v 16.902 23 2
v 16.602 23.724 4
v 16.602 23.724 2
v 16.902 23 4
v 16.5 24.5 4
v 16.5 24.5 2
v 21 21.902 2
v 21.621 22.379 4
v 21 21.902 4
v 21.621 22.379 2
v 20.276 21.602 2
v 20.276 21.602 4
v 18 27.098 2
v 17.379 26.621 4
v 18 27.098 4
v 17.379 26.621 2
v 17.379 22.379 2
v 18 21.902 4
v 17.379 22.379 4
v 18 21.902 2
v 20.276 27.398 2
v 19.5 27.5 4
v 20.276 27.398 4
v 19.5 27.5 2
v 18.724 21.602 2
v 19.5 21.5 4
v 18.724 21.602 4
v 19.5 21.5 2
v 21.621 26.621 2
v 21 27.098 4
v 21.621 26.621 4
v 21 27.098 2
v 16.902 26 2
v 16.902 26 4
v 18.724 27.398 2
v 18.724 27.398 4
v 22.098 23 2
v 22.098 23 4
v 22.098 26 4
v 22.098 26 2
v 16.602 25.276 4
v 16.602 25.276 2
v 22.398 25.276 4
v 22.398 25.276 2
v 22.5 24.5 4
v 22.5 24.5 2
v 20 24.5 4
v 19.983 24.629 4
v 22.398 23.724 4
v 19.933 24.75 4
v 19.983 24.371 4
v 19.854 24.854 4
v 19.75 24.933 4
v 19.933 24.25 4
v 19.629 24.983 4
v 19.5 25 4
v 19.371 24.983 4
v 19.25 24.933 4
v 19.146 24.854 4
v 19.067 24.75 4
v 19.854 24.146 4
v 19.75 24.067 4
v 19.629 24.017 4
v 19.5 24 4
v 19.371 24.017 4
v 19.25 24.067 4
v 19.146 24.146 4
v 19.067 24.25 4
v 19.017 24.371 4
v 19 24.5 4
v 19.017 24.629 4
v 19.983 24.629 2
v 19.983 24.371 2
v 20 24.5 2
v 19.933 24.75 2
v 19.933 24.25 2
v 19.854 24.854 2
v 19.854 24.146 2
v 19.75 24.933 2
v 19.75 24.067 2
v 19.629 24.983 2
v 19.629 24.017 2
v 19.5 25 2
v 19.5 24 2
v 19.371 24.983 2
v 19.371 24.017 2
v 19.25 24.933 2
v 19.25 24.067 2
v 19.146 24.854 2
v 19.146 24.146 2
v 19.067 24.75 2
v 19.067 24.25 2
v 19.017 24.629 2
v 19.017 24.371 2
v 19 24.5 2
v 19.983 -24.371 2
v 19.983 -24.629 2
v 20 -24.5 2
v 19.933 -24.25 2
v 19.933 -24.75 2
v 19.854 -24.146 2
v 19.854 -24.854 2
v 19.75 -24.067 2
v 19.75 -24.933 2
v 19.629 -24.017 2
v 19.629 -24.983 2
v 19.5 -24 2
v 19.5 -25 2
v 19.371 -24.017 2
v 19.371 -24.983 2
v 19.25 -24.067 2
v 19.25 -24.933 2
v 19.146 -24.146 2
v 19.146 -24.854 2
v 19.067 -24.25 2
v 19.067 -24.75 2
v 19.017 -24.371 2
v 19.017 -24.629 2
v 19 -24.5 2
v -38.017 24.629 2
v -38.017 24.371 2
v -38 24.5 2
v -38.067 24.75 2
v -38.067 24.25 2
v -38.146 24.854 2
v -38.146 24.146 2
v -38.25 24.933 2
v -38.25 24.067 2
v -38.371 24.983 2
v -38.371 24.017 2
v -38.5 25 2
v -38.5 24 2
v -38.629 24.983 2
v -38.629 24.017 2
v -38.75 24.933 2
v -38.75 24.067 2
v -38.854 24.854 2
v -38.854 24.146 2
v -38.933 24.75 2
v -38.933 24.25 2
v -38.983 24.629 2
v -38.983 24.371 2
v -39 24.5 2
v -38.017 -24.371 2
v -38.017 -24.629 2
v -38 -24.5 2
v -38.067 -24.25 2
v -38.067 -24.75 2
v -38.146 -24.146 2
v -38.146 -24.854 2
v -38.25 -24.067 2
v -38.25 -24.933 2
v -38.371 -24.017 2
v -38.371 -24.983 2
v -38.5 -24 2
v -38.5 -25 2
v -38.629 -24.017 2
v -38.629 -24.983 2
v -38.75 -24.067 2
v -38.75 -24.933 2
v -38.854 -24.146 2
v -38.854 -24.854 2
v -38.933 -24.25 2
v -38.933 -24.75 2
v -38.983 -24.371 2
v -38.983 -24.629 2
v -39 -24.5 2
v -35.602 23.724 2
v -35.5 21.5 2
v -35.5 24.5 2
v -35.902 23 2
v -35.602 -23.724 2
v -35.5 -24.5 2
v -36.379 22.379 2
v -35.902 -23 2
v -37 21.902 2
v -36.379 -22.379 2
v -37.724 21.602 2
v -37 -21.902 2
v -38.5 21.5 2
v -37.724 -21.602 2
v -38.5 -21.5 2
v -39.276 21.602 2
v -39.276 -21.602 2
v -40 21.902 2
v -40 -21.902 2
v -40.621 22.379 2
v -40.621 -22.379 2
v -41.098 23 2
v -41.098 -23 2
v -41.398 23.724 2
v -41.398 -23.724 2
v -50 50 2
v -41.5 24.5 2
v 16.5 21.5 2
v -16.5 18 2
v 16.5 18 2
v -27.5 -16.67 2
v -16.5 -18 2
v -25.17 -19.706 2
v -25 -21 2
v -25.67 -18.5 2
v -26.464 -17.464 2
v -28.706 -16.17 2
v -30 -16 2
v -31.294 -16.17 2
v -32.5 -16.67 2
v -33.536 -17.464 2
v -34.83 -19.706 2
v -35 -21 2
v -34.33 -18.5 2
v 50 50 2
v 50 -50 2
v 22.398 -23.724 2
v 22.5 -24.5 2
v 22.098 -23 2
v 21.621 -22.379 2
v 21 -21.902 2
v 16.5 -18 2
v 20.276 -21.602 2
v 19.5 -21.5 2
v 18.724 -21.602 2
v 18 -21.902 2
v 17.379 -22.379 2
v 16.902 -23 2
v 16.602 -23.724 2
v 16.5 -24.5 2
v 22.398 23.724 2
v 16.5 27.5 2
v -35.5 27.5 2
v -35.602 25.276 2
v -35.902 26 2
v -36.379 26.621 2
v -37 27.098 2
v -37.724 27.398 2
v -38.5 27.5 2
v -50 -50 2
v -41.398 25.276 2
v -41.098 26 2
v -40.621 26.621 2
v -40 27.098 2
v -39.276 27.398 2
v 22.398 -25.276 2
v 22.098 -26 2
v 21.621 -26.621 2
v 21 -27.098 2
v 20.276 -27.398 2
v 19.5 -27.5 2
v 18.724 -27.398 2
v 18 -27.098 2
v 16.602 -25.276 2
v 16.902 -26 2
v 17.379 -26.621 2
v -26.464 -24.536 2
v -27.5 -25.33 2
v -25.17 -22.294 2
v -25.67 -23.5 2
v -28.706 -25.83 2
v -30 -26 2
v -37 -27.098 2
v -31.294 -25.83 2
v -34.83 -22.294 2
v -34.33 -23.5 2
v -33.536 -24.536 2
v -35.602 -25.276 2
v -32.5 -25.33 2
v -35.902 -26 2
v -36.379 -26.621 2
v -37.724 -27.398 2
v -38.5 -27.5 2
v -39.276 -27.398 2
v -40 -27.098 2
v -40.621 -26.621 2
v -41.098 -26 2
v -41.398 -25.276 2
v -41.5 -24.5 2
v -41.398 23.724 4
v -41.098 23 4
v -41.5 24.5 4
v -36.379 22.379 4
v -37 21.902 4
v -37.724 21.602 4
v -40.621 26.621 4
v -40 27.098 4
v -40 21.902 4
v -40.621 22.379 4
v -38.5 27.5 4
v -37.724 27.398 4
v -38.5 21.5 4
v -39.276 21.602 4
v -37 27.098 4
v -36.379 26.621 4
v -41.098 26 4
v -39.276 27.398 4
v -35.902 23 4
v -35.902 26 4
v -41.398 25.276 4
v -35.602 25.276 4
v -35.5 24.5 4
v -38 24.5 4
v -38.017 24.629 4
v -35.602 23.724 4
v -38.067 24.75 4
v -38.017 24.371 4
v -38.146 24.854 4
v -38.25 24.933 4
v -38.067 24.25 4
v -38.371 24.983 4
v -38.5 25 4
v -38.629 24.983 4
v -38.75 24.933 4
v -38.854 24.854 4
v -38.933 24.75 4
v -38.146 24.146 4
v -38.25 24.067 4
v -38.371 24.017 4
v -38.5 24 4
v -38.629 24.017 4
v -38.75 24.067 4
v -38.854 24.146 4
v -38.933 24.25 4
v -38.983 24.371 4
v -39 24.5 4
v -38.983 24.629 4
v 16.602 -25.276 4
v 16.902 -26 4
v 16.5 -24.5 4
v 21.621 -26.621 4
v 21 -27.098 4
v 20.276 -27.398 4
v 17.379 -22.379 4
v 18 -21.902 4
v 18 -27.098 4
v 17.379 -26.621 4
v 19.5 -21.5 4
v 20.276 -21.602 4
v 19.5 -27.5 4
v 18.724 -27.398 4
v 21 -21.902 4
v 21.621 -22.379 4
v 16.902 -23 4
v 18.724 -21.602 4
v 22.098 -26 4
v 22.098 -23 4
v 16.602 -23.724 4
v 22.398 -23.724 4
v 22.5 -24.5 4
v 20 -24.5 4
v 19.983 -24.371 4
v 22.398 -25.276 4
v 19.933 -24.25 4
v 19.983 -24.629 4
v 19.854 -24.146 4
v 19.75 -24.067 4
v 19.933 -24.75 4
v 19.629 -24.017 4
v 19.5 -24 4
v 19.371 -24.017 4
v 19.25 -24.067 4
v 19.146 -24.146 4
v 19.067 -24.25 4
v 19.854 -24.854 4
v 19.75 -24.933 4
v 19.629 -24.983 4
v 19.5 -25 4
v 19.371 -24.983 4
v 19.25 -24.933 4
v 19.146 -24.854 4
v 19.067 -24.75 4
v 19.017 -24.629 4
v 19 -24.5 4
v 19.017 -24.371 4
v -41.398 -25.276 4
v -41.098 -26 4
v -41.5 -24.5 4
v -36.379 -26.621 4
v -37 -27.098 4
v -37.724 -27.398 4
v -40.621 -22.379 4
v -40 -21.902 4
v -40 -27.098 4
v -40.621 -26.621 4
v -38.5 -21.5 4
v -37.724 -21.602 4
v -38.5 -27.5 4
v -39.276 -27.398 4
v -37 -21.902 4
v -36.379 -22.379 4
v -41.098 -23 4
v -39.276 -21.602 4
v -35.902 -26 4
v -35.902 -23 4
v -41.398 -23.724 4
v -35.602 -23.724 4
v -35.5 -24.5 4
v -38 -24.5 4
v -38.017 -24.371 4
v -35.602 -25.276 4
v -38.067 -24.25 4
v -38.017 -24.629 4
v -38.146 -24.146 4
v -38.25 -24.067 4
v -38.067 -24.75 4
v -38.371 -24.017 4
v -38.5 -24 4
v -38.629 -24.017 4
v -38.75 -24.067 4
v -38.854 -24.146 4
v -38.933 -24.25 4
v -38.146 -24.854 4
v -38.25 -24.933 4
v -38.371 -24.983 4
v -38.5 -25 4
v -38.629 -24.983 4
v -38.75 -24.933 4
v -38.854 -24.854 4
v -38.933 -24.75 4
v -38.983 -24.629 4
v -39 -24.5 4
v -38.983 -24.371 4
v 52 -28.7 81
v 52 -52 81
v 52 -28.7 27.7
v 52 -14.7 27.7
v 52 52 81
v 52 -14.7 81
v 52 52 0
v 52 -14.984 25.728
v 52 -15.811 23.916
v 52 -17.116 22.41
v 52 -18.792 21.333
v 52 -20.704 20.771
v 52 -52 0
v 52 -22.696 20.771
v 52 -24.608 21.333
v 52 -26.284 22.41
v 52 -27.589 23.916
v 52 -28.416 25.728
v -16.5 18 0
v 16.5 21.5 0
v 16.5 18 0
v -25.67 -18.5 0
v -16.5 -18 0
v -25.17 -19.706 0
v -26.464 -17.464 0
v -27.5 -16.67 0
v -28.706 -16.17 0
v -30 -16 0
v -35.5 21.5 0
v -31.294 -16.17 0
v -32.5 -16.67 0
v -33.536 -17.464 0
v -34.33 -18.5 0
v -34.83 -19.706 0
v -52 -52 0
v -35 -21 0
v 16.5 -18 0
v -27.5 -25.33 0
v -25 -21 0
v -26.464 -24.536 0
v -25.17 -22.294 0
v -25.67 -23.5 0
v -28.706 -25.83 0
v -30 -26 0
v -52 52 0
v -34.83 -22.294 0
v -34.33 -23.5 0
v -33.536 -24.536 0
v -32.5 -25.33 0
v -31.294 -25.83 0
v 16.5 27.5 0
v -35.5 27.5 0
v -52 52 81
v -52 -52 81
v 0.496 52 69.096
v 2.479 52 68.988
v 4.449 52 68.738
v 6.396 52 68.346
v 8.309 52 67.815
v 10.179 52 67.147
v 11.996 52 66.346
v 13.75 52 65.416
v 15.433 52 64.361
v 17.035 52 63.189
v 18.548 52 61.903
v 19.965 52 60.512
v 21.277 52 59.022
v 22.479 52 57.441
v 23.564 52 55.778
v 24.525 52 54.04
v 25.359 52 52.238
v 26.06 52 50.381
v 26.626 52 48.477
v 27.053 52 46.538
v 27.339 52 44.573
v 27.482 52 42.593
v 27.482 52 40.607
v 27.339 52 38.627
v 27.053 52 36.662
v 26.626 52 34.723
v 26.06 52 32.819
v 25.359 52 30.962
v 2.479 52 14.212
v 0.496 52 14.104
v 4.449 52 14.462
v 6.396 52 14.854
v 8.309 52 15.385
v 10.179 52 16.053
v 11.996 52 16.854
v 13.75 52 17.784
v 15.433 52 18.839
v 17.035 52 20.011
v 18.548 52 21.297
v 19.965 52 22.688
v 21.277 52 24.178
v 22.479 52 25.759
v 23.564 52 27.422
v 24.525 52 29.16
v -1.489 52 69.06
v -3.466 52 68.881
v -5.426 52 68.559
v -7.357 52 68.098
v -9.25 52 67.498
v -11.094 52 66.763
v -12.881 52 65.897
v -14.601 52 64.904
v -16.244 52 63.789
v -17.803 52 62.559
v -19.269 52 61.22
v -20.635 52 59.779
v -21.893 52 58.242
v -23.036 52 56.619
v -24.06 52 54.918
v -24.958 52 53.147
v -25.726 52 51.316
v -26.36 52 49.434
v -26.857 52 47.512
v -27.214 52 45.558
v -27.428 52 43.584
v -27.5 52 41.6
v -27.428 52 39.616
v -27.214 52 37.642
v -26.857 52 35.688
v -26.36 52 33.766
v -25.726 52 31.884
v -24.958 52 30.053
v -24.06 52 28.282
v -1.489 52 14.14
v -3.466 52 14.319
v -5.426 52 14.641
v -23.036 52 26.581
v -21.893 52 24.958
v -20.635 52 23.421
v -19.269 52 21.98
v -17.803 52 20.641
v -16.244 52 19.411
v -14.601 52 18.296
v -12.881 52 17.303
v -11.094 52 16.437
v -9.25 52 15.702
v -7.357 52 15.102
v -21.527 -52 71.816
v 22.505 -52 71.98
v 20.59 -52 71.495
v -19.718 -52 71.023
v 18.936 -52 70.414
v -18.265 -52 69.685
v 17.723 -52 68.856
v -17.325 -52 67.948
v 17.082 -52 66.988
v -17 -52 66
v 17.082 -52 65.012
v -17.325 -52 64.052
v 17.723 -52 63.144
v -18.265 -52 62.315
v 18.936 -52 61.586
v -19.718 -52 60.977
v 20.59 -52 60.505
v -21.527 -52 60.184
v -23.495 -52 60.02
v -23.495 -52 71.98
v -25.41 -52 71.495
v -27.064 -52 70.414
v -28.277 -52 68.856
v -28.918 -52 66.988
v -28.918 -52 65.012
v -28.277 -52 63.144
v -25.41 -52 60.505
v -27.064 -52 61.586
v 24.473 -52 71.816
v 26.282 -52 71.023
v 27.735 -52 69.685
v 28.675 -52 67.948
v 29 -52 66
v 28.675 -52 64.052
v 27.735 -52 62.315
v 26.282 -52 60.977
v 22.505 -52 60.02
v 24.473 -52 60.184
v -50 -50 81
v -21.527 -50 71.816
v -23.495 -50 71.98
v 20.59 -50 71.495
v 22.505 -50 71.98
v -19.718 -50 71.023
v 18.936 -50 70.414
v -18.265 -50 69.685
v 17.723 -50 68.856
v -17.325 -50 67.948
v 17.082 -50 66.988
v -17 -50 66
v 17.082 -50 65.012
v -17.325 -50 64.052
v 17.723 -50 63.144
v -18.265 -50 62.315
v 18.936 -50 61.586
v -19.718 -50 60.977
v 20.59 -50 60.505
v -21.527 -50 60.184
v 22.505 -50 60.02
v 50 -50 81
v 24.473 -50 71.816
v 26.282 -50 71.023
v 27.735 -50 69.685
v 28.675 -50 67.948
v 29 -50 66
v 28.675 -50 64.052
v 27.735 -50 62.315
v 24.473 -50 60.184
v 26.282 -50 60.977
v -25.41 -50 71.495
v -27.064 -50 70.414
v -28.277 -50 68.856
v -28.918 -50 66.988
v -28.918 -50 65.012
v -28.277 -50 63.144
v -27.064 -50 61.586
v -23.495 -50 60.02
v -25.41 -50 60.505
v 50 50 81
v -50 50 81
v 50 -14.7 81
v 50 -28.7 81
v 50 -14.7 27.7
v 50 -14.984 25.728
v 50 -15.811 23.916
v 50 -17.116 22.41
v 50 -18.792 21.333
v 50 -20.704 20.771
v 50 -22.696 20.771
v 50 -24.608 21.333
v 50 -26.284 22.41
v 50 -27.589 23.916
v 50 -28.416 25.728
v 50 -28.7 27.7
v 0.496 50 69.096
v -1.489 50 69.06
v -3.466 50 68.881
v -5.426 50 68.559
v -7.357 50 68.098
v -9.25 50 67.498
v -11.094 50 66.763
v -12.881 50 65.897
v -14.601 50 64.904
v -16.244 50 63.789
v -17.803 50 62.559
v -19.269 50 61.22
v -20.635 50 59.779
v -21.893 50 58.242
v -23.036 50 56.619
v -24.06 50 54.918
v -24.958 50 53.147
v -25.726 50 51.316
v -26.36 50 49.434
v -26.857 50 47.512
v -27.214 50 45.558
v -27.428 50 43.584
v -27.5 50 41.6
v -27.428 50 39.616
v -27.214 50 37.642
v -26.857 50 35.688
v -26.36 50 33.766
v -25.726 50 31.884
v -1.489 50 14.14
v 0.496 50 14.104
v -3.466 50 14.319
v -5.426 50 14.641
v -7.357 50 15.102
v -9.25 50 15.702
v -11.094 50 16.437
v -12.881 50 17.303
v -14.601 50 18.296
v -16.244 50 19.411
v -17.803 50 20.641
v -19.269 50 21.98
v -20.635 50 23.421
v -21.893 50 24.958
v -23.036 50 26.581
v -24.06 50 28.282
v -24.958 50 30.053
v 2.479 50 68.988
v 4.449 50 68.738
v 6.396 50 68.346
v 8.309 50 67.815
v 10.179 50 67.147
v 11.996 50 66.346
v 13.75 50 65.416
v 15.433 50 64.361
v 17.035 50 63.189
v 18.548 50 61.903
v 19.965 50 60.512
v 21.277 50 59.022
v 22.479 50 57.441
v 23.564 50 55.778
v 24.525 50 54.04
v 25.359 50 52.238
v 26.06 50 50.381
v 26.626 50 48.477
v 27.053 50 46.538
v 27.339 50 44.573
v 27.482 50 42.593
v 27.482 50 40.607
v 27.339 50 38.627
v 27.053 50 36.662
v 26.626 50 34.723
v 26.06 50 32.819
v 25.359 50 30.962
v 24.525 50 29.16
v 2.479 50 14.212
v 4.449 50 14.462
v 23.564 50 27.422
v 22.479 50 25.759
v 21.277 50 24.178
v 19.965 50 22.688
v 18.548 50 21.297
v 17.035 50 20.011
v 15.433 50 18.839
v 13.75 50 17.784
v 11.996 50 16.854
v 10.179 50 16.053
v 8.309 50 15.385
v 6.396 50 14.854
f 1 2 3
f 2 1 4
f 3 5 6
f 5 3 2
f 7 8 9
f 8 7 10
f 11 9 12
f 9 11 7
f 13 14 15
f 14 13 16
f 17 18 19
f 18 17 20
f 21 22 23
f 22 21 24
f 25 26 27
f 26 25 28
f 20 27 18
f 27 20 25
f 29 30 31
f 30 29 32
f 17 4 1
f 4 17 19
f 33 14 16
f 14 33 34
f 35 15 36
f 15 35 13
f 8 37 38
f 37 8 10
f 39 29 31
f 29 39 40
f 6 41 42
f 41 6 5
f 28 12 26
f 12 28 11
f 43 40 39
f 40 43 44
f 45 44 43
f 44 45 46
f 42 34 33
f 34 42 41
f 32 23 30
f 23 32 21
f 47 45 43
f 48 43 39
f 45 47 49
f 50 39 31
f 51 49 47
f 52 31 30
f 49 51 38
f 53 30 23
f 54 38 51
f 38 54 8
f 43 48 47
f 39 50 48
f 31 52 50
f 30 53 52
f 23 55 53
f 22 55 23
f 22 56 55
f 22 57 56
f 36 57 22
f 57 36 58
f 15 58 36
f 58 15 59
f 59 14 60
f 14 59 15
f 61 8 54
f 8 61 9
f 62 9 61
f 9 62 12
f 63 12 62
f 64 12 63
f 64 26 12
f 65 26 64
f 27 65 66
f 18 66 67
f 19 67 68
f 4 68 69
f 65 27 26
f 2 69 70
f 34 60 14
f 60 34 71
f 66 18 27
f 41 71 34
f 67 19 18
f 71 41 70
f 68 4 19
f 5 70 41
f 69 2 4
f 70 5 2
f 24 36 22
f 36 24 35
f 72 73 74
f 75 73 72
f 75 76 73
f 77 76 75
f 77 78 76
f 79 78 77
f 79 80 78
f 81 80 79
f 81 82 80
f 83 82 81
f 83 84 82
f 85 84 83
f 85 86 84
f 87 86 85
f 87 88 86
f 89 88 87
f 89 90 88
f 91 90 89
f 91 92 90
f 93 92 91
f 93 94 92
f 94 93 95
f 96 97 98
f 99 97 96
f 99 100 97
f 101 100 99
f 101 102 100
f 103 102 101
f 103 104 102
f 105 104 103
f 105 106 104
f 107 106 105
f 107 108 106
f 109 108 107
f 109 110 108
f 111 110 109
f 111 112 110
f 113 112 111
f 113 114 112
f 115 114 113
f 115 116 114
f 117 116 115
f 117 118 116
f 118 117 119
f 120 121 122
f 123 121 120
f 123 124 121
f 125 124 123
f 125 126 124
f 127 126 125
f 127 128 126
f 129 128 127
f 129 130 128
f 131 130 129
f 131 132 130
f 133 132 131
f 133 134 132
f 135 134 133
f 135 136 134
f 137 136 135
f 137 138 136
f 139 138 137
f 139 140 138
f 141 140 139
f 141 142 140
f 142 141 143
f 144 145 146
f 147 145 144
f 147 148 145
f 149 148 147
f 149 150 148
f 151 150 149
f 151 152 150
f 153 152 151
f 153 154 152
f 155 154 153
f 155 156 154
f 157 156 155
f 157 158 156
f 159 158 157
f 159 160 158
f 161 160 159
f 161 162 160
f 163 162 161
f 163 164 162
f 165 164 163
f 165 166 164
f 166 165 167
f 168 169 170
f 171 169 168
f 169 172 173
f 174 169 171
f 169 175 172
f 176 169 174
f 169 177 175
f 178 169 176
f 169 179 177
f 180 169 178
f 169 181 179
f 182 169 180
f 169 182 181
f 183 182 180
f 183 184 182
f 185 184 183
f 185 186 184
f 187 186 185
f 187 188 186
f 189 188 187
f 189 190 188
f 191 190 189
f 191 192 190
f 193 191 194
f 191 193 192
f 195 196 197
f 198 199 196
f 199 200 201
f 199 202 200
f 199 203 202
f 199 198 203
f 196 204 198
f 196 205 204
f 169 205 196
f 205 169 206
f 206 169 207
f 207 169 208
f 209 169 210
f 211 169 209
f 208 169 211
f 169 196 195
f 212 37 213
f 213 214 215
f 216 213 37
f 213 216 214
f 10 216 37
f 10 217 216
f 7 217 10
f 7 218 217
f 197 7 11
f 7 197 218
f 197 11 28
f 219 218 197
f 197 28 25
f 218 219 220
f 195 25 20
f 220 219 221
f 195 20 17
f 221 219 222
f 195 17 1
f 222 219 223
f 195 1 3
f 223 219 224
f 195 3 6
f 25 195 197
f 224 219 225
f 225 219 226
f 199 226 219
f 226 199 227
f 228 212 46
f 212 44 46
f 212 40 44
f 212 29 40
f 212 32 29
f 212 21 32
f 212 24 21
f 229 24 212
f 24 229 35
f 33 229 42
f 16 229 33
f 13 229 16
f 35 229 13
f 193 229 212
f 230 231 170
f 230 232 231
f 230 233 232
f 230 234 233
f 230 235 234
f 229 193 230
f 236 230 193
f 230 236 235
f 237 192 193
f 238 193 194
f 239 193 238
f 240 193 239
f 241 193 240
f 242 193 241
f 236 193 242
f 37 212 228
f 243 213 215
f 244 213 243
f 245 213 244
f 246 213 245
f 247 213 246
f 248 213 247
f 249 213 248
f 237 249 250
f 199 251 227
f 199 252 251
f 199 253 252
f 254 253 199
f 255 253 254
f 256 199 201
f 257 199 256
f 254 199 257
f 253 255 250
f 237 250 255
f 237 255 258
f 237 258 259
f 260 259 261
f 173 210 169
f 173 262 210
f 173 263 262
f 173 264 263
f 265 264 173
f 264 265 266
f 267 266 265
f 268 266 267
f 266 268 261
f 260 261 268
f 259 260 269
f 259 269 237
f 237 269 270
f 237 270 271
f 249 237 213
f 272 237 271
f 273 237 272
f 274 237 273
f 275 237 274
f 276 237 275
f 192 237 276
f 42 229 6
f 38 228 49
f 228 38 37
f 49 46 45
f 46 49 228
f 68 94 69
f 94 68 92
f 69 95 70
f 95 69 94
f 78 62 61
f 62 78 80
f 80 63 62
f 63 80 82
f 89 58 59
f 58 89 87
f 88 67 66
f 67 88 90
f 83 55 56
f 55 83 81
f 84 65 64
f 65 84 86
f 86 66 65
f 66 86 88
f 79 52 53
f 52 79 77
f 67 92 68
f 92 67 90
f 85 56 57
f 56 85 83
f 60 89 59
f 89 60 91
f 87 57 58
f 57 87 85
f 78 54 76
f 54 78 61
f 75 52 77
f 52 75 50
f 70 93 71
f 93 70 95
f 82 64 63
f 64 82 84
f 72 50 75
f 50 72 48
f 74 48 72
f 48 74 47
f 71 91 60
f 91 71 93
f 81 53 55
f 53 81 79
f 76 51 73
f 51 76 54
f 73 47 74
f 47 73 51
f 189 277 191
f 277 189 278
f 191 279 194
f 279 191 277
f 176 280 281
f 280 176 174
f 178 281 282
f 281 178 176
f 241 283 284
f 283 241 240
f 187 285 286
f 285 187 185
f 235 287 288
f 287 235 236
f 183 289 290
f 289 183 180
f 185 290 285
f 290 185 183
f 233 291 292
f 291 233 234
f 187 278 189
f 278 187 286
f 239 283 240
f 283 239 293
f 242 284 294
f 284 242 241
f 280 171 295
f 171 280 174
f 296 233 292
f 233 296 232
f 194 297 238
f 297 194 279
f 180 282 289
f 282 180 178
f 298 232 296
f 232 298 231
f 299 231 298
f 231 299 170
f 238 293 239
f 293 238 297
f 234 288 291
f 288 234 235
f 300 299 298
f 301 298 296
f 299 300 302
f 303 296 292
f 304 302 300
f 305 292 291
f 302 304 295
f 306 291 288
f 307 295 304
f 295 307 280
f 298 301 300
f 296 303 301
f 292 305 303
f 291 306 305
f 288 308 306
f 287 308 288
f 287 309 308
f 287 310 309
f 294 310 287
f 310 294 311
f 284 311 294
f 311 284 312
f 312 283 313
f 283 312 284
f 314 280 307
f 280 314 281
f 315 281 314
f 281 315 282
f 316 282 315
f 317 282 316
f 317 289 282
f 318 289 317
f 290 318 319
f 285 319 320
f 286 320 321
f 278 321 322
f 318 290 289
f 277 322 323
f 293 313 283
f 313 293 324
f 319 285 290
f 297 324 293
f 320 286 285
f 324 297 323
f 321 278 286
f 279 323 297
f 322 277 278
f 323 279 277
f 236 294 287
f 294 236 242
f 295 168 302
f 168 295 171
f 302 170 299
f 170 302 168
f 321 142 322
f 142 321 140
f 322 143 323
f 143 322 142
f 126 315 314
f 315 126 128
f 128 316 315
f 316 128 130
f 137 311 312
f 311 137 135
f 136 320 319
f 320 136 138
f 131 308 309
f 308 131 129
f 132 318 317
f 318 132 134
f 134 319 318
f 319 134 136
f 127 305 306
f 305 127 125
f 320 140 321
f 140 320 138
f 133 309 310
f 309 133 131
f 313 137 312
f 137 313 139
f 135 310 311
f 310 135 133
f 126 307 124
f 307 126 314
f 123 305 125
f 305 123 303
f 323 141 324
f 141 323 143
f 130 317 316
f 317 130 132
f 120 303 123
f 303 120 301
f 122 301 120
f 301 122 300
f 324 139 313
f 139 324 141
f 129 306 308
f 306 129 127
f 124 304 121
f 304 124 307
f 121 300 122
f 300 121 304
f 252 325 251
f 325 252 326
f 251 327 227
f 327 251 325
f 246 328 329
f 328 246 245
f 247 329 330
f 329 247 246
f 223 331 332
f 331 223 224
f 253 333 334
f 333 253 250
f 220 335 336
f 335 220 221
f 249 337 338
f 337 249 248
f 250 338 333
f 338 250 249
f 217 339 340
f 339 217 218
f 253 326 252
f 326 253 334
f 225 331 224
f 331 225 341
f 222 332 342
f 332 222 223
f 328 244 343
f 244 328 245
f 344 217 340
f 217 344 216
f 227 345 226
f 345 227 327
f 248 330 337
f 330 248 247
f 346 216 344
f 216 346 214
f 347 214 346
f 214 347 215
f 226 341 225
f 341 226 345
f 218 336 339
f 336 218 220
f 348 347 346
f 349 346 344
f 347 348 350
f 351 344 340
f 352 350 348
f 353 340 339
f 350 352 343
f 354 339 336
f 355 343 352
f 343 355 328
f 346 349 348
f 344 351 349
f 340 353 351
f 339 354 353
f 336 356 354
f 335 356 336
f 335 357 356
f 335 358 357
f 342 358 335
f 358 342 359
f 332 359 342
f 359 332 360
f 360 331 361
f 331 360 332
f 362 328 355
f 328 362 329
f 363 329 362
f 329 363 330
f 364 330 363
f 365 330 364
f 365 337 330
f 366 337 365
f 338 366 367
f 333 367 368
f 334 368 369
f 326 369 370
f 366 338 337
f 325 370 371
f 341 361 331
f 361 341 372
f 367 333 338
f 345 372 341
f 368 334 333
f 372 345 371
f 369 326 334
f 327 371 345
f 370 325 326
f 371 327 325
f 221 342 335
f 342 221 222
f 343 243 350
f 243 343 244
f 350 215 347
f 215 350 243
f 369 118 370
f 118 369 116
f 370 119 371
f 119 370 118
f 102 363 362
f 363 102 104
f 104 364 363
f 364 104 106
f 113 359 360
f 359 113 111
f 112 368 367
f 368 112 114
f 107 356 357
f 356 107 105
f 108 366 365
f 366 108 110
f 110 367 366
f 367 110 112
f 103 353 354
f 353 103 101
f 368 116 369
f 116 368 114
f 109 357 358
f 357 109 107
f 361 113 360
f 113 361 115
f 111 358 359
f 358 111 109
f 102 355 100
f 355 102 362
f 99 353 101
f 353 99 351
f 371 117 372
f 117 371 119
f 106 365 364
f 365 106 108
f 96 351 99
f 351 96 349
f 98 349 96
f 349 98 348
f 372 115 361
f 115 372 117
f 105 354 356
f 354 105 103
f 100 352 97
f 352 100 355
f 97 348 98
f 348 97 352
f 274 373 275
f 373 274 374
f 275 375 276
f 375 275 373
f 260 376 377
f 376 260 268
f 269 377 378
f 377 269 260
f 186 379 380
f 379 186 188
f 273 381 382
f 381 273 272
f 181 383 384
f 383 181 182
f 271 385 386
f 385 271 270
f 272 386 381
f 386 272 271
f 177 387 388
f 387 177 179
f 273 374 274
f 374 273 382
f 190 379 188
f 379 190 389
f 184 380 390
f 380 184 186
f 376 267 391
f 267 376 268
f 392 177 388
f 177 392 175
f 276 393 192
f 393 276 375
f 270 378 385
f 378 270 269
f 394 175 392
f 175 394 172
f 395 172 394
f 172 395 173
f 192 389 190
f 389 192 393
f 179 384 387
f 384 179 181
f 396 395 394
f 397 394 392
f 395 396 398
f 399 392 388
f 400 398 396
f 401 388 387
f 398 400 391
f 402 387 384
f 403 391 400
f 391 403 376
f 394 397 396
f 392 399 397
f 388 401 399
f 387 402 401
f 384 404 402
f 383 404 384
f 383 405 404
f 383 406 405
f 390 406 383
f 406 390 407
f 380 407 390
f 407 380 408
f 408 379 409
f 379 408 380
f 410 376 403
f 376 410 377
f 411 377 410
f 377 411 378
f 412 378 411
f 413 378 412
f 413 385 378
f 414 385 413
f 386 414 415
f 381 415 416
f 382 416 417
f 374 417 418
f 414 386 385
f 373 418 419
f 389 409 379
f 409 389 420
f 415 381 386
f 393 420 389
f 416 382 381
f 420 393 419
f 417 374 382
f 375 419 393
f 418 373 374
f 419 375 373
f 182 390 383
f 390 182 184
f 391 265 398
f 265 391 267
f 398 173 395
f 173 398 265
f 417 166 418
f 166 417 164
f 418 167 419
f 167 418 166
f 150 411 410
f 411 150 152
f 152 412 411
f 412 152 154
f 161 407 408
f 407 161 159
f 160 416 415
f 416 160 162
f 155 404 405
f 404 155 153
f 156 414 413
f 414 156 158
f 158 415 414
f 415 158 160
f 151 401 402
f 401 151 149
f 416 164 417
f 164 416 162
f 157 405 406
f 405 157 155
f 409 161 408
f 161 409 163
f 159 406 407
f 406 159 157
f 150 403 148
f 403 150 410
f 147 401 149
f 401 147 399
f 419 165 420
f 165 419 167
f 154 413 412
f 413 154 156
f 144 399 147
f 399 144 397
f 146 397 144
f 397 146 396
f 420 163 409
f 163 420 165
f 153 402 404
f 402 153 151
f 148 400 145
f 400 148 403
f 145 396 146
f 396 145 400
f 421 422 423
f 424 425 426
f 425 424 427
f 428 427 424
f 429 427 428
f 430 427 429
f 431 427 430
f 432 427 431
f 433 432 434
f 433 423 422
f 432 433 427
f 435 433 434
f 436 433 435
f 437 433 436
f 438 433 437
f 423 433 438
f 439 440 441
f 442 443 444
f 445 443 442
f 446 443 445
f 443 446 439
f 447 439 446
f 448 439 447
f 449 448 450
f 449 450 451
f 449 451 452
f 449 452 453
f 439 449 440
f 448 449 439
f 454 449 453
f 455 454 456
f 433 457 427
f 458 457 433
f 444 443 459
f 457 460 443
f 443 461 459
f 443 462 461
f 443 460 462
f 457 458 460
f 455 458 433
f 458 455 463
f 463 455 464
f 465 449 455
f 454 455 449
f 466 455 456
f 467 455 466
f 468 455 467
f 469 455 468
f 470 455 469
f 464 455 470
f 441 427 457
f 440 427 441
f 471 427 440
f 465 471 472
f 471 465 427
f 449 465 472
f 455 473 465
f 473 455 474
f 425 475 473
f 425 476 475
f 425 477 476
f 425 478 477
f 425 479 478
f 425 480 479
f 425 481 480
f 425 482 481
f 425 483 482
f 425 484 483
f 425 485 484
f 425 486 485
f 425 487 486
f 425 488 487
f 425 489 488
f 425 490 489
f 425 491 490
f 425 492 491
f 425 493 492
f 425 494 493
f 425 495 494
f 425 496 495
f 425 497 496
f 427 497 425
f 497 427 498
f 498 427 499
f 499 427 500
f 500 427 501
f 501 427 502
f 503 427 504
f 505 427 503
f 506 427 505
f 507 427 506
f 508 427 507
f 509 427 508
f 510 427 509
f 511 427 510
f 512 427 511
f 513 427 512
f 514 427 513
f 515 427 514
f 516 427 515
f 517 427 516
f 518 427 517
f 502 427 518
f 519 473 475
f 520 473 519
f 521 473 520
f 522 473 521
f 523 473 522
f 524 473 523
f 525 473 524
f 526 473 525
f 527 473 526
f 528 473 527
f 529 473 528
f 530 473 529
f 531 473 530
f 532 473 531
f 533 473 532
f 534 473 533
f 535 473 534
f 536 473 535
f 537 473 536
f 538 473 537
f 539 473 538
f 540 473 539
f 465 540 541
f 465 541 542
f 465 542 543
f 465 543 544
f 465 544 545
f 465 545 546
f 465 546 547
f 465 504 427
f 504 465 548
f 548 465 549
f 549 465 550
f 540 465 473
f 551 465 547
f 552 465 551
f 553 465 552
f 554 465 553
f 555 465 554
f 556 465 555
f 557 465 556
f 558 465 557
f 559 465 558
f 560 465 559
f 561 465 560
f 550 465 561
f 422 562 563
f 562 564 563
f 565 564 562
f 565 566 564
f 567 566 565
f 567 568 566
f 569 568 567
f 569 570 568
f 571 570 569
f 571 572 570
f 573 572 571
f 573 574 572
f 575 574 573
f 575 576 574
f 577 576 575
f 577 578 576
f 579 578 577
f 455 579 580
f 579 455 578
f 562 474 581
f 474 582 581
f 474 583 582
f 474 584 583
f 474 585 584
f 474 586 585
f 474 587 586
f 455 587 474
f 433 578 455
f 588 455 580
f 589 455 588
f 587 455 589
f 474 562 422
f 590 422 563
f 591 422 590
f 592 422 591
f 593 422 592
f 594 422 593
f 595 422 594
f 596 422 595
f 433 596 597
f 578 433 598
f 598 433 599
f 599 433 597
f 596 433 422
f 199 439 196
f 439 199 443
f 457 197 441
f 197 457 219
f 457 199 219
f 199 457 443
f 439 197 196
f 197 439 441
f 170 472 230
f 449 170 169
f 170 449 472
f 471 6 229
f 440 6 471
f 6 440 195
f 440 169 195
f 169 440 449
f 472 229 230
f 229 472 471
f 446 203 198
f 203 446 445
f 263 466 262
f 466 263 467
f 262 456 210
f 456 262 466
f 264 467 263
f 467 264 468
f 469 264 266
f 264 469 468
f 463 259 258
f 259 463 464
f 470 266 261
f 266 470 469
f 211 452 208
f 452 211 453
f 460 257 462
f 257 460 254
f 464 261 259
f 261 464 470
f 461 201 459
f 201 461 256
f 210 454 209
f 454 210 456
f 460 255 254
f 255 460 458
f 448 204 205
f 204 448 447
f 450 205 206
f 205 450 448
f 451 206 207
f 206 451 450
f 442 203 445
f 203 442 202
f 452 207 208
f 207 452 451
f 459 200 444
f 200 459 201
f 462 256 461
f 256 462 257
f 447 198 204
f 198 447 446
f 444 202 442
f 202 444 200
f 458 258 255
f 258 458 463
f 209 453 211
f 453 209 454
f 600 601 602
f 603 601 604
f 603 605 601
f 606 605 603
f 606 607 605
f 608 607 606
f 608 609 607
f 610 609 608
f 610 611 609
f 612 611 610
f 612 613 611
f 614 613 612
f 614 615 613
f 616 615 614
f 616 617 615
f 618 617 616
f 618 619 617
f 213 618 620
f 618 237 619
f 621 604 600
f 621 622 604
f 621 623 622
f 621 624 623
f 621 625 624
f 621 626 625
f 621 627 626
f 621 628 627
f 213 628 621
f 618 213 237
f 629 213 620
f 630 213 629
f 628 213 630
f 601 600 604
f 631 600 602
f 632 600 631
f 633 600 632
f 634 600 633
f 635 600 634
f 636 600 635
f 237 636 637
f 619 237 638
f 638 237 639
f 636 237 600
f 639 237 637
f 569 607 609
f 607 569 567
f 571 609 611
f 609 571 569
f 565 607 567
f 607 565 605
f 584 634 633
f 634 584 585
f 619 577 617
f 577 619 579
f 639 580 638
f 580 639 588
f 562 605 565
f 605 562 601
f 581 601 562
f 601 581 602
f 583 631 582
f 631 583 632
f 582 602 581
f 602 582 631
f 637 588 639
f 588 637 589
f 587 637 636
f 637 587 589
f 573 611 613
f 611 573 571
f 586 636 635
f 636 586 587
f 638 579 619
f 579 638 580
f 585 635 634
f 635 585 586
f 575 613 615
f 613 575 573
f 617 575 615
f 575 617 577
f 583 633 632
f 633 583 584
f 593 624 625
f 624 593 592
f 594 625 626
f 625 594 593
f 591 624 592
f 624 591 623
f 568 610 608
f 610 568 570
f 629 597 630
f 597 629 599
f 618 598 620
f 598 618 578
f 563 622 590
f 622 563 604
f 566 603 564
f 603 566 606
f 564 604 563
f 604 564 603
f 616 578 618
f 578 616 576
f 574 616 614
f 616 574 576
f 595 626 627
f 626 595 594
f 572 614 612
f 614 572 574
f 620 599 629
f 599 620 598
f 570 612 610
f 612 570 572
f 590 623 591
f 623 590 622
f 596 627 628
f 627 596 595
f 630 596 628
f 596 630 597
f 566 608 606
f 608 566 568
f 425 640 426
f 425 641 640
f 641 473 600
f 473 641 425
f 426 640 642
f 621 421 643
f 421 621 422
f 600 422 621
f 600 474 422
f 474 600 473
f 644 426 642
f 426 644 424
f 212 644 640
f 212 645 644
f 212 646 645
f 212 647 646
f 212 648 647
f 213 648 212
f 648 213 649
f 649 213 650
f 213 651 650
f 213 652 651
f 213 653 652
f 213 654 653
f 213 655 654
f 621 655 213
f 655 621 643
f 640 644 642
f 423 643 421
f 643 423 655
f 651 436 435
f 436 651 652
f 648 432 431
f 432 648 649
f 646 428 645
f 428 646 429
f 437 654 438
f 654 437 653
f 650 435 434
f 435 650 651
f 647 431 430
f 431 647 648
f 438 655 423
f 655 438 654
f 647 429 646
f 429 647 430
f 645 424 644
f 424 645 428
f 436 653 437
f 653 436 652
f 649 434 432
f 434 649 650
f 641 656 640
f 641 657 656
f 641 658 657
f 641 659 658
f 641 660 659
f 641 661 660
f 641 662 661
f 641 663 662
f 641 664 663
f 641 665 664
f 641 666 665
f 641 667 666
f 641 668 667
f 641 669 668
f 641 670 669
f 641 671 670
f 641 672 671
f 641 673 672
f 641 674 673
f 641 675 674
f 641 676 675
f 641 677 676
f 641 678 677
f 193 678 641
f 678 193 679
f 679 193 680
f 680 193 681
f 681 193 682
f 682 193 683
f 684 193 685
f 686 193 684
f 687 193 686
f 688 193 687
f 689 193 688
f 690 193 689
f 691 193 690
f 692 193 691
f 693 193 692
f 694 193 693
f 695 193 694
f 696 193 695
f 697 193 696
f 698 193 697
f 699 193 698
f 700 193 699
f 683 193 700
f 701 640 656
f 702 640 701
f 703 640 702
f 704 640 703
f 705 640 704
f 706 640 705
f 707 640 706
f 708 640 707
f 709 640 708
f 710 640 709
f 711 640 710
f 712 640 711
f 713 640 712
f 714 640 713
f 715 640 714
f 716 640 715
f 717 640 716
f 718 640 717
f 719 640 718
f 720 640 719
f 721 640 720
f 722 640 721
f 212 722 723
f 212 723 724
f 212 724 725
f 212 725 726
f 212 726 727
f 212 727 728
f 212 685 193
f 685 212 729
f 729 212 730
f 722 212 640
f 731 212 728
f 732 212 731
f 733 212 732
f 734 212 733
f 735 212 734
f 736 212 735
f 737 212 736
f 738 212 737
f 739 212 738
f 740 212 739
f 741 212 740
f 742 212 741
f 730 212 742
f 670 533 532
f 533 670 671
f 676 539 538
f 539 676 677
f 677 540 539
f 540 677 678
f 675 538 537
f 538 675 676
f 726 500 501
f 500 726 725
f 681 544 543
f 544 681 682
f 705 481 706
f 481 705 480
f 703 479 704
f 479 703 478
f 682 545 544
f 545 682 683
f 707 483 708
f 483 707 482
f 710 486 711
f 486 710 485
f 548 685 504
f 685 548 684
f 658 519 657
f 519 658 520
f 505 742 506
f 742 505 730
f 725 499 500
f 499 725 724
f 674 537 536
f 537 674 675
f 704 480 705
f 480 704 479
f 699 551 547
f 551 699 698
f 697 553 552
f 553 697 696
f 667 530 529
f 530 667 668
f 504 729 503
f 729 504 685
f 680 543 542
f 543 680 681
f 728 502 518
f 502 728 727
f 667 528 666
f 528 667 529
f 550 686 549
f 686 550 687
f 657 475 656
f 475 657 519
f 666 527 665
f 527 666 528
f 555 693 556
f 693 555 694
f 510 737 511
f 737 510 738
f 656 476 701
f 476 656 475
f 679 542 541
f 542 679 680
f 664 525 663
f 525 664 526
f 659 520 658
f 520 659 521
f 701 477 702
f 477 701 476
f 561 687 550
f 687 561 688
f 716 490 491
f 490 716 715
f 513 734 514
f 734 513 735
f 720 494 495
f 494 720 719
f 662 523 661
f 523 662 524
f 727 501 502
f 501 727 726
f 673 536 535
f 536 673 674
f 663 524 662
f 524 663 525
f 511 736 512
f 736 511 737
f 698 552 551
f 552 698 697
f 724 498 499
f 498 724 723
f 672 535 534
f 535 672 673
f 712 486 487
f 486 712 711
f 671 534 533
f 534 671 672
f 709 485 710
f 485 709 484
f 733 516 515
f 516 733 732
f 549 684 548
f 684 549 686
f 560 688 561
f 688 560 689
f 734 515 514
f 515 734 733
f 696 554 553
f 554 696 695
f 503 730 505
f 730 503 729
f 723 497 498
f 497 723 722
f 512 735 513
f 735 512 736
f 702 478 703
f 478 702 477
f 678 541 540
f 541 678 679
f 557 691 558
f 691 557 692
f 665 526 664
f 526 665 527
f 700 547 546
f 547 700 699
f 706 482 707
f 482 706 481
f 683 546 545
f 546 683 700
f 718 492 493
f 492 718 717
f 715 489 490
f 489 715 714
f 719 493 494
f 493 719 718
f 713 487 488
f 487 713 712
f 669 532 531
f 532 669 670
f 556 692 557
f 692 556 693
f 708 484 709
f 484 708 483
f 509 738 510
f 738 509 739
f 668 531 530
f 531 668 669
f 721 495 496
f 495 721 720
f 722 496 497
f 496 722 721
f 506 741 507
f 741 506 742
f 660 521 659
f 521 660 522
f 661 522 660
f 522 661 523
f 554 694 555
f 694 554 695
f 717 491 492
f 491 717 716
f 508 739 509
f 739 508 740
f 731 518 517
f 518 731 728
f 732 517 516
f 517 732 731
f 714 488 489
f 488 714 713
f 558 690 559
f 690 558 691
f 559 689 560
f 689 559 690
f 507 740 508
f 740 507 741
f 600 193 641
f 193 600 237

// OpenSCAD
/************************************************************************
* Copyright 2017-2018 IBM Corp. All Rights Reserved.
*
* Watson Maker Kits - OpenSCAD design
*
* This project is licensed under the Apache License 2.0, see LICENSE.*
*
************************************************************************
*
* This Open SCAD file can be used to generate the STL files for the
* TJBot physical enclosure
*
************************************************************************
* Version history
*
* Date 			Author				Description
* 2017-10-20	Philippe Gregoire	Initial design for the TJ Bot Head
* 2018-04-26	Philippe Gregoire	Optional SenseHat aperture
* 2018-08-23	Franck Descollonges	Extra height for SenseHat (4mm) (see _fd_ comments)
*/

//// The various parts of the robot are each coded in their own module
// using the same naming convention as the robot's individual STL
// files.

/**********************************************************************/
/* Robot dimensional parameters                                       */
_thickness=2;

// Head dimensions
_headSide=_thickness*2 + 100;
_headHeight=_thickness + 75 + 4; //_fd_:added 4mn Extra heightfor SenseHat

// LED Hole. Placed at the center of the head's top
_LEDHoleDiam=9.98;

// Hat will be placed so that the LED array is at the center, connector to the back. Replaces LED
// SenseHat apertures constants
_SENSE_W=65;
_SENSE_L=56;
_SLEDS_X=6;
_SLEDS_W=33;
_SLEDS_Y=10.5;
_SLEDS_L=36;
_SCON_X=6;
_SCON_W=52;
_SCON_Y=1;
_SCON_L=6;
_SJOY_X=52.5;
_SJOY_Y=49.5;
_SJOY_D=10;
_SHOLES=[[3,4],[61,4],[3,53],[61,53]];

// SenseHat pods dimensions
_SensePodsDiam=6;
_SensePodsHole=1;
_SensePodsHeight=2;

// Select style, LED or SenseHat
//_Style='LED';
_style="SenseHat";

// Eyes dimensions
_eyeDiam=12;
_eyeSpacing=_eyeDiam+34;
_eyeZ=62+4; //_fd_: 4mn ofset for eyes

// Speaker
_speakerDiam=55;
_speakerZ=41.6;

// Side slit for arm
_armSlitWidth=14;
_armSlitHeight=53.3;
_armSlitOffset=30.3;

/* Helper module to place SenseHat components */
module _tjbot_13_head_Sense(style) {
	if(style=="SenseHat") {
		rotate([0,0,180]) {
			// Center LED array
			translate([-_SLEDS_X-_SLEDS_W/2,-_SLEDS_Y-_SLEDS_L/2]) {
				children();
			}
		}
	}
}

/*  Main module to build the head - Part #13
*/
module tjbot_13_head(
	th=_thickness,
	w=_headSide,l=_headSide,lh=_LEDHoleDiam,
	h=_headHeight,
	ed=_eyeDiam,es=_eyeSpacing,ez=_eyeZ,
	sd=_speakerDiam,sZ=_speakerZ,
	aw=_armSlitWidth,ah=_armSlitHeight,ao=_armSlitOffset,
	style=_style,
	spd=_SensePodsDiam,sph=_SensePodsHole,spt=_SensePodsHeight) {
		
	// head top plate, removing LED hole
	difference() {
		union() {
			// Top Plate
			translate([-w/2,-l/2,0]) cube([w,l,th]);
			// Mounting pods
			_tjbot_13_head_Sense(style) {
				$fn=24;
				// screws
				for(h=_SHOLES) {
					translate([h[0],h[1],th+spt/2])
						difference() {
							cylinder(d=spd,h=spt,center=true);
							cylinder(d=sph,h=spt,center=true);
						}
				}
			}
		}
		union() {
			// LED Hole
			if(style=="LED") {
				cylinder(d=lh,h=th);
			}
			// SenseHat Aperture
			_tjbot_13_head_Sense(style) {
				// LED array aperture
				translate([_SLEDS_X,_SLEDS_Y])
					cube([_SLEDS_W,_SLEDS_L,th]);
				// Connector aperture
				translate([_SCON_X,_SCON_Y])
					cube([_SCON_W,_SCON_L,th]);
				// Joystick hole
				translate([_SJOY_X,_SJOY_Y,th/2])
					cylinder(d=_SJOY_D,h=th,center=true,$fn=24);
			}
		}		
	}
	
	// build 4x head sides
	for(a=[0:1:3]) {
		rotate([90,0,a*90]) translate([-w/2,0,w/2-th]) {
			difference() {
				cube([w,h,th]);
				
				// Now take into account sides singular characteristics
				if(a==0) { // Front side, holes for eyes
					for(x=[-es/2,es/2])
						translate([w/2+x,ez])
							cylinder(d=ed,h=th);
				} else if(a==1) { // right side, slit for arm
					translate([ao-aw/2,h-ah]) 
						cube([aw,ah,th]); 
					translate([ao,h-ah]) 
						cylinder(d=aw,h=th);	
				} else if(a==2) { // Back side, speaker hole
					translate([w/2,sZ])
						cylinder(d=sd,h=th,$fa=1);
				}
			}
		}
	}	
}

/* To generate and individual part, uncomment the corresponding line */
tjbot_13_head();
